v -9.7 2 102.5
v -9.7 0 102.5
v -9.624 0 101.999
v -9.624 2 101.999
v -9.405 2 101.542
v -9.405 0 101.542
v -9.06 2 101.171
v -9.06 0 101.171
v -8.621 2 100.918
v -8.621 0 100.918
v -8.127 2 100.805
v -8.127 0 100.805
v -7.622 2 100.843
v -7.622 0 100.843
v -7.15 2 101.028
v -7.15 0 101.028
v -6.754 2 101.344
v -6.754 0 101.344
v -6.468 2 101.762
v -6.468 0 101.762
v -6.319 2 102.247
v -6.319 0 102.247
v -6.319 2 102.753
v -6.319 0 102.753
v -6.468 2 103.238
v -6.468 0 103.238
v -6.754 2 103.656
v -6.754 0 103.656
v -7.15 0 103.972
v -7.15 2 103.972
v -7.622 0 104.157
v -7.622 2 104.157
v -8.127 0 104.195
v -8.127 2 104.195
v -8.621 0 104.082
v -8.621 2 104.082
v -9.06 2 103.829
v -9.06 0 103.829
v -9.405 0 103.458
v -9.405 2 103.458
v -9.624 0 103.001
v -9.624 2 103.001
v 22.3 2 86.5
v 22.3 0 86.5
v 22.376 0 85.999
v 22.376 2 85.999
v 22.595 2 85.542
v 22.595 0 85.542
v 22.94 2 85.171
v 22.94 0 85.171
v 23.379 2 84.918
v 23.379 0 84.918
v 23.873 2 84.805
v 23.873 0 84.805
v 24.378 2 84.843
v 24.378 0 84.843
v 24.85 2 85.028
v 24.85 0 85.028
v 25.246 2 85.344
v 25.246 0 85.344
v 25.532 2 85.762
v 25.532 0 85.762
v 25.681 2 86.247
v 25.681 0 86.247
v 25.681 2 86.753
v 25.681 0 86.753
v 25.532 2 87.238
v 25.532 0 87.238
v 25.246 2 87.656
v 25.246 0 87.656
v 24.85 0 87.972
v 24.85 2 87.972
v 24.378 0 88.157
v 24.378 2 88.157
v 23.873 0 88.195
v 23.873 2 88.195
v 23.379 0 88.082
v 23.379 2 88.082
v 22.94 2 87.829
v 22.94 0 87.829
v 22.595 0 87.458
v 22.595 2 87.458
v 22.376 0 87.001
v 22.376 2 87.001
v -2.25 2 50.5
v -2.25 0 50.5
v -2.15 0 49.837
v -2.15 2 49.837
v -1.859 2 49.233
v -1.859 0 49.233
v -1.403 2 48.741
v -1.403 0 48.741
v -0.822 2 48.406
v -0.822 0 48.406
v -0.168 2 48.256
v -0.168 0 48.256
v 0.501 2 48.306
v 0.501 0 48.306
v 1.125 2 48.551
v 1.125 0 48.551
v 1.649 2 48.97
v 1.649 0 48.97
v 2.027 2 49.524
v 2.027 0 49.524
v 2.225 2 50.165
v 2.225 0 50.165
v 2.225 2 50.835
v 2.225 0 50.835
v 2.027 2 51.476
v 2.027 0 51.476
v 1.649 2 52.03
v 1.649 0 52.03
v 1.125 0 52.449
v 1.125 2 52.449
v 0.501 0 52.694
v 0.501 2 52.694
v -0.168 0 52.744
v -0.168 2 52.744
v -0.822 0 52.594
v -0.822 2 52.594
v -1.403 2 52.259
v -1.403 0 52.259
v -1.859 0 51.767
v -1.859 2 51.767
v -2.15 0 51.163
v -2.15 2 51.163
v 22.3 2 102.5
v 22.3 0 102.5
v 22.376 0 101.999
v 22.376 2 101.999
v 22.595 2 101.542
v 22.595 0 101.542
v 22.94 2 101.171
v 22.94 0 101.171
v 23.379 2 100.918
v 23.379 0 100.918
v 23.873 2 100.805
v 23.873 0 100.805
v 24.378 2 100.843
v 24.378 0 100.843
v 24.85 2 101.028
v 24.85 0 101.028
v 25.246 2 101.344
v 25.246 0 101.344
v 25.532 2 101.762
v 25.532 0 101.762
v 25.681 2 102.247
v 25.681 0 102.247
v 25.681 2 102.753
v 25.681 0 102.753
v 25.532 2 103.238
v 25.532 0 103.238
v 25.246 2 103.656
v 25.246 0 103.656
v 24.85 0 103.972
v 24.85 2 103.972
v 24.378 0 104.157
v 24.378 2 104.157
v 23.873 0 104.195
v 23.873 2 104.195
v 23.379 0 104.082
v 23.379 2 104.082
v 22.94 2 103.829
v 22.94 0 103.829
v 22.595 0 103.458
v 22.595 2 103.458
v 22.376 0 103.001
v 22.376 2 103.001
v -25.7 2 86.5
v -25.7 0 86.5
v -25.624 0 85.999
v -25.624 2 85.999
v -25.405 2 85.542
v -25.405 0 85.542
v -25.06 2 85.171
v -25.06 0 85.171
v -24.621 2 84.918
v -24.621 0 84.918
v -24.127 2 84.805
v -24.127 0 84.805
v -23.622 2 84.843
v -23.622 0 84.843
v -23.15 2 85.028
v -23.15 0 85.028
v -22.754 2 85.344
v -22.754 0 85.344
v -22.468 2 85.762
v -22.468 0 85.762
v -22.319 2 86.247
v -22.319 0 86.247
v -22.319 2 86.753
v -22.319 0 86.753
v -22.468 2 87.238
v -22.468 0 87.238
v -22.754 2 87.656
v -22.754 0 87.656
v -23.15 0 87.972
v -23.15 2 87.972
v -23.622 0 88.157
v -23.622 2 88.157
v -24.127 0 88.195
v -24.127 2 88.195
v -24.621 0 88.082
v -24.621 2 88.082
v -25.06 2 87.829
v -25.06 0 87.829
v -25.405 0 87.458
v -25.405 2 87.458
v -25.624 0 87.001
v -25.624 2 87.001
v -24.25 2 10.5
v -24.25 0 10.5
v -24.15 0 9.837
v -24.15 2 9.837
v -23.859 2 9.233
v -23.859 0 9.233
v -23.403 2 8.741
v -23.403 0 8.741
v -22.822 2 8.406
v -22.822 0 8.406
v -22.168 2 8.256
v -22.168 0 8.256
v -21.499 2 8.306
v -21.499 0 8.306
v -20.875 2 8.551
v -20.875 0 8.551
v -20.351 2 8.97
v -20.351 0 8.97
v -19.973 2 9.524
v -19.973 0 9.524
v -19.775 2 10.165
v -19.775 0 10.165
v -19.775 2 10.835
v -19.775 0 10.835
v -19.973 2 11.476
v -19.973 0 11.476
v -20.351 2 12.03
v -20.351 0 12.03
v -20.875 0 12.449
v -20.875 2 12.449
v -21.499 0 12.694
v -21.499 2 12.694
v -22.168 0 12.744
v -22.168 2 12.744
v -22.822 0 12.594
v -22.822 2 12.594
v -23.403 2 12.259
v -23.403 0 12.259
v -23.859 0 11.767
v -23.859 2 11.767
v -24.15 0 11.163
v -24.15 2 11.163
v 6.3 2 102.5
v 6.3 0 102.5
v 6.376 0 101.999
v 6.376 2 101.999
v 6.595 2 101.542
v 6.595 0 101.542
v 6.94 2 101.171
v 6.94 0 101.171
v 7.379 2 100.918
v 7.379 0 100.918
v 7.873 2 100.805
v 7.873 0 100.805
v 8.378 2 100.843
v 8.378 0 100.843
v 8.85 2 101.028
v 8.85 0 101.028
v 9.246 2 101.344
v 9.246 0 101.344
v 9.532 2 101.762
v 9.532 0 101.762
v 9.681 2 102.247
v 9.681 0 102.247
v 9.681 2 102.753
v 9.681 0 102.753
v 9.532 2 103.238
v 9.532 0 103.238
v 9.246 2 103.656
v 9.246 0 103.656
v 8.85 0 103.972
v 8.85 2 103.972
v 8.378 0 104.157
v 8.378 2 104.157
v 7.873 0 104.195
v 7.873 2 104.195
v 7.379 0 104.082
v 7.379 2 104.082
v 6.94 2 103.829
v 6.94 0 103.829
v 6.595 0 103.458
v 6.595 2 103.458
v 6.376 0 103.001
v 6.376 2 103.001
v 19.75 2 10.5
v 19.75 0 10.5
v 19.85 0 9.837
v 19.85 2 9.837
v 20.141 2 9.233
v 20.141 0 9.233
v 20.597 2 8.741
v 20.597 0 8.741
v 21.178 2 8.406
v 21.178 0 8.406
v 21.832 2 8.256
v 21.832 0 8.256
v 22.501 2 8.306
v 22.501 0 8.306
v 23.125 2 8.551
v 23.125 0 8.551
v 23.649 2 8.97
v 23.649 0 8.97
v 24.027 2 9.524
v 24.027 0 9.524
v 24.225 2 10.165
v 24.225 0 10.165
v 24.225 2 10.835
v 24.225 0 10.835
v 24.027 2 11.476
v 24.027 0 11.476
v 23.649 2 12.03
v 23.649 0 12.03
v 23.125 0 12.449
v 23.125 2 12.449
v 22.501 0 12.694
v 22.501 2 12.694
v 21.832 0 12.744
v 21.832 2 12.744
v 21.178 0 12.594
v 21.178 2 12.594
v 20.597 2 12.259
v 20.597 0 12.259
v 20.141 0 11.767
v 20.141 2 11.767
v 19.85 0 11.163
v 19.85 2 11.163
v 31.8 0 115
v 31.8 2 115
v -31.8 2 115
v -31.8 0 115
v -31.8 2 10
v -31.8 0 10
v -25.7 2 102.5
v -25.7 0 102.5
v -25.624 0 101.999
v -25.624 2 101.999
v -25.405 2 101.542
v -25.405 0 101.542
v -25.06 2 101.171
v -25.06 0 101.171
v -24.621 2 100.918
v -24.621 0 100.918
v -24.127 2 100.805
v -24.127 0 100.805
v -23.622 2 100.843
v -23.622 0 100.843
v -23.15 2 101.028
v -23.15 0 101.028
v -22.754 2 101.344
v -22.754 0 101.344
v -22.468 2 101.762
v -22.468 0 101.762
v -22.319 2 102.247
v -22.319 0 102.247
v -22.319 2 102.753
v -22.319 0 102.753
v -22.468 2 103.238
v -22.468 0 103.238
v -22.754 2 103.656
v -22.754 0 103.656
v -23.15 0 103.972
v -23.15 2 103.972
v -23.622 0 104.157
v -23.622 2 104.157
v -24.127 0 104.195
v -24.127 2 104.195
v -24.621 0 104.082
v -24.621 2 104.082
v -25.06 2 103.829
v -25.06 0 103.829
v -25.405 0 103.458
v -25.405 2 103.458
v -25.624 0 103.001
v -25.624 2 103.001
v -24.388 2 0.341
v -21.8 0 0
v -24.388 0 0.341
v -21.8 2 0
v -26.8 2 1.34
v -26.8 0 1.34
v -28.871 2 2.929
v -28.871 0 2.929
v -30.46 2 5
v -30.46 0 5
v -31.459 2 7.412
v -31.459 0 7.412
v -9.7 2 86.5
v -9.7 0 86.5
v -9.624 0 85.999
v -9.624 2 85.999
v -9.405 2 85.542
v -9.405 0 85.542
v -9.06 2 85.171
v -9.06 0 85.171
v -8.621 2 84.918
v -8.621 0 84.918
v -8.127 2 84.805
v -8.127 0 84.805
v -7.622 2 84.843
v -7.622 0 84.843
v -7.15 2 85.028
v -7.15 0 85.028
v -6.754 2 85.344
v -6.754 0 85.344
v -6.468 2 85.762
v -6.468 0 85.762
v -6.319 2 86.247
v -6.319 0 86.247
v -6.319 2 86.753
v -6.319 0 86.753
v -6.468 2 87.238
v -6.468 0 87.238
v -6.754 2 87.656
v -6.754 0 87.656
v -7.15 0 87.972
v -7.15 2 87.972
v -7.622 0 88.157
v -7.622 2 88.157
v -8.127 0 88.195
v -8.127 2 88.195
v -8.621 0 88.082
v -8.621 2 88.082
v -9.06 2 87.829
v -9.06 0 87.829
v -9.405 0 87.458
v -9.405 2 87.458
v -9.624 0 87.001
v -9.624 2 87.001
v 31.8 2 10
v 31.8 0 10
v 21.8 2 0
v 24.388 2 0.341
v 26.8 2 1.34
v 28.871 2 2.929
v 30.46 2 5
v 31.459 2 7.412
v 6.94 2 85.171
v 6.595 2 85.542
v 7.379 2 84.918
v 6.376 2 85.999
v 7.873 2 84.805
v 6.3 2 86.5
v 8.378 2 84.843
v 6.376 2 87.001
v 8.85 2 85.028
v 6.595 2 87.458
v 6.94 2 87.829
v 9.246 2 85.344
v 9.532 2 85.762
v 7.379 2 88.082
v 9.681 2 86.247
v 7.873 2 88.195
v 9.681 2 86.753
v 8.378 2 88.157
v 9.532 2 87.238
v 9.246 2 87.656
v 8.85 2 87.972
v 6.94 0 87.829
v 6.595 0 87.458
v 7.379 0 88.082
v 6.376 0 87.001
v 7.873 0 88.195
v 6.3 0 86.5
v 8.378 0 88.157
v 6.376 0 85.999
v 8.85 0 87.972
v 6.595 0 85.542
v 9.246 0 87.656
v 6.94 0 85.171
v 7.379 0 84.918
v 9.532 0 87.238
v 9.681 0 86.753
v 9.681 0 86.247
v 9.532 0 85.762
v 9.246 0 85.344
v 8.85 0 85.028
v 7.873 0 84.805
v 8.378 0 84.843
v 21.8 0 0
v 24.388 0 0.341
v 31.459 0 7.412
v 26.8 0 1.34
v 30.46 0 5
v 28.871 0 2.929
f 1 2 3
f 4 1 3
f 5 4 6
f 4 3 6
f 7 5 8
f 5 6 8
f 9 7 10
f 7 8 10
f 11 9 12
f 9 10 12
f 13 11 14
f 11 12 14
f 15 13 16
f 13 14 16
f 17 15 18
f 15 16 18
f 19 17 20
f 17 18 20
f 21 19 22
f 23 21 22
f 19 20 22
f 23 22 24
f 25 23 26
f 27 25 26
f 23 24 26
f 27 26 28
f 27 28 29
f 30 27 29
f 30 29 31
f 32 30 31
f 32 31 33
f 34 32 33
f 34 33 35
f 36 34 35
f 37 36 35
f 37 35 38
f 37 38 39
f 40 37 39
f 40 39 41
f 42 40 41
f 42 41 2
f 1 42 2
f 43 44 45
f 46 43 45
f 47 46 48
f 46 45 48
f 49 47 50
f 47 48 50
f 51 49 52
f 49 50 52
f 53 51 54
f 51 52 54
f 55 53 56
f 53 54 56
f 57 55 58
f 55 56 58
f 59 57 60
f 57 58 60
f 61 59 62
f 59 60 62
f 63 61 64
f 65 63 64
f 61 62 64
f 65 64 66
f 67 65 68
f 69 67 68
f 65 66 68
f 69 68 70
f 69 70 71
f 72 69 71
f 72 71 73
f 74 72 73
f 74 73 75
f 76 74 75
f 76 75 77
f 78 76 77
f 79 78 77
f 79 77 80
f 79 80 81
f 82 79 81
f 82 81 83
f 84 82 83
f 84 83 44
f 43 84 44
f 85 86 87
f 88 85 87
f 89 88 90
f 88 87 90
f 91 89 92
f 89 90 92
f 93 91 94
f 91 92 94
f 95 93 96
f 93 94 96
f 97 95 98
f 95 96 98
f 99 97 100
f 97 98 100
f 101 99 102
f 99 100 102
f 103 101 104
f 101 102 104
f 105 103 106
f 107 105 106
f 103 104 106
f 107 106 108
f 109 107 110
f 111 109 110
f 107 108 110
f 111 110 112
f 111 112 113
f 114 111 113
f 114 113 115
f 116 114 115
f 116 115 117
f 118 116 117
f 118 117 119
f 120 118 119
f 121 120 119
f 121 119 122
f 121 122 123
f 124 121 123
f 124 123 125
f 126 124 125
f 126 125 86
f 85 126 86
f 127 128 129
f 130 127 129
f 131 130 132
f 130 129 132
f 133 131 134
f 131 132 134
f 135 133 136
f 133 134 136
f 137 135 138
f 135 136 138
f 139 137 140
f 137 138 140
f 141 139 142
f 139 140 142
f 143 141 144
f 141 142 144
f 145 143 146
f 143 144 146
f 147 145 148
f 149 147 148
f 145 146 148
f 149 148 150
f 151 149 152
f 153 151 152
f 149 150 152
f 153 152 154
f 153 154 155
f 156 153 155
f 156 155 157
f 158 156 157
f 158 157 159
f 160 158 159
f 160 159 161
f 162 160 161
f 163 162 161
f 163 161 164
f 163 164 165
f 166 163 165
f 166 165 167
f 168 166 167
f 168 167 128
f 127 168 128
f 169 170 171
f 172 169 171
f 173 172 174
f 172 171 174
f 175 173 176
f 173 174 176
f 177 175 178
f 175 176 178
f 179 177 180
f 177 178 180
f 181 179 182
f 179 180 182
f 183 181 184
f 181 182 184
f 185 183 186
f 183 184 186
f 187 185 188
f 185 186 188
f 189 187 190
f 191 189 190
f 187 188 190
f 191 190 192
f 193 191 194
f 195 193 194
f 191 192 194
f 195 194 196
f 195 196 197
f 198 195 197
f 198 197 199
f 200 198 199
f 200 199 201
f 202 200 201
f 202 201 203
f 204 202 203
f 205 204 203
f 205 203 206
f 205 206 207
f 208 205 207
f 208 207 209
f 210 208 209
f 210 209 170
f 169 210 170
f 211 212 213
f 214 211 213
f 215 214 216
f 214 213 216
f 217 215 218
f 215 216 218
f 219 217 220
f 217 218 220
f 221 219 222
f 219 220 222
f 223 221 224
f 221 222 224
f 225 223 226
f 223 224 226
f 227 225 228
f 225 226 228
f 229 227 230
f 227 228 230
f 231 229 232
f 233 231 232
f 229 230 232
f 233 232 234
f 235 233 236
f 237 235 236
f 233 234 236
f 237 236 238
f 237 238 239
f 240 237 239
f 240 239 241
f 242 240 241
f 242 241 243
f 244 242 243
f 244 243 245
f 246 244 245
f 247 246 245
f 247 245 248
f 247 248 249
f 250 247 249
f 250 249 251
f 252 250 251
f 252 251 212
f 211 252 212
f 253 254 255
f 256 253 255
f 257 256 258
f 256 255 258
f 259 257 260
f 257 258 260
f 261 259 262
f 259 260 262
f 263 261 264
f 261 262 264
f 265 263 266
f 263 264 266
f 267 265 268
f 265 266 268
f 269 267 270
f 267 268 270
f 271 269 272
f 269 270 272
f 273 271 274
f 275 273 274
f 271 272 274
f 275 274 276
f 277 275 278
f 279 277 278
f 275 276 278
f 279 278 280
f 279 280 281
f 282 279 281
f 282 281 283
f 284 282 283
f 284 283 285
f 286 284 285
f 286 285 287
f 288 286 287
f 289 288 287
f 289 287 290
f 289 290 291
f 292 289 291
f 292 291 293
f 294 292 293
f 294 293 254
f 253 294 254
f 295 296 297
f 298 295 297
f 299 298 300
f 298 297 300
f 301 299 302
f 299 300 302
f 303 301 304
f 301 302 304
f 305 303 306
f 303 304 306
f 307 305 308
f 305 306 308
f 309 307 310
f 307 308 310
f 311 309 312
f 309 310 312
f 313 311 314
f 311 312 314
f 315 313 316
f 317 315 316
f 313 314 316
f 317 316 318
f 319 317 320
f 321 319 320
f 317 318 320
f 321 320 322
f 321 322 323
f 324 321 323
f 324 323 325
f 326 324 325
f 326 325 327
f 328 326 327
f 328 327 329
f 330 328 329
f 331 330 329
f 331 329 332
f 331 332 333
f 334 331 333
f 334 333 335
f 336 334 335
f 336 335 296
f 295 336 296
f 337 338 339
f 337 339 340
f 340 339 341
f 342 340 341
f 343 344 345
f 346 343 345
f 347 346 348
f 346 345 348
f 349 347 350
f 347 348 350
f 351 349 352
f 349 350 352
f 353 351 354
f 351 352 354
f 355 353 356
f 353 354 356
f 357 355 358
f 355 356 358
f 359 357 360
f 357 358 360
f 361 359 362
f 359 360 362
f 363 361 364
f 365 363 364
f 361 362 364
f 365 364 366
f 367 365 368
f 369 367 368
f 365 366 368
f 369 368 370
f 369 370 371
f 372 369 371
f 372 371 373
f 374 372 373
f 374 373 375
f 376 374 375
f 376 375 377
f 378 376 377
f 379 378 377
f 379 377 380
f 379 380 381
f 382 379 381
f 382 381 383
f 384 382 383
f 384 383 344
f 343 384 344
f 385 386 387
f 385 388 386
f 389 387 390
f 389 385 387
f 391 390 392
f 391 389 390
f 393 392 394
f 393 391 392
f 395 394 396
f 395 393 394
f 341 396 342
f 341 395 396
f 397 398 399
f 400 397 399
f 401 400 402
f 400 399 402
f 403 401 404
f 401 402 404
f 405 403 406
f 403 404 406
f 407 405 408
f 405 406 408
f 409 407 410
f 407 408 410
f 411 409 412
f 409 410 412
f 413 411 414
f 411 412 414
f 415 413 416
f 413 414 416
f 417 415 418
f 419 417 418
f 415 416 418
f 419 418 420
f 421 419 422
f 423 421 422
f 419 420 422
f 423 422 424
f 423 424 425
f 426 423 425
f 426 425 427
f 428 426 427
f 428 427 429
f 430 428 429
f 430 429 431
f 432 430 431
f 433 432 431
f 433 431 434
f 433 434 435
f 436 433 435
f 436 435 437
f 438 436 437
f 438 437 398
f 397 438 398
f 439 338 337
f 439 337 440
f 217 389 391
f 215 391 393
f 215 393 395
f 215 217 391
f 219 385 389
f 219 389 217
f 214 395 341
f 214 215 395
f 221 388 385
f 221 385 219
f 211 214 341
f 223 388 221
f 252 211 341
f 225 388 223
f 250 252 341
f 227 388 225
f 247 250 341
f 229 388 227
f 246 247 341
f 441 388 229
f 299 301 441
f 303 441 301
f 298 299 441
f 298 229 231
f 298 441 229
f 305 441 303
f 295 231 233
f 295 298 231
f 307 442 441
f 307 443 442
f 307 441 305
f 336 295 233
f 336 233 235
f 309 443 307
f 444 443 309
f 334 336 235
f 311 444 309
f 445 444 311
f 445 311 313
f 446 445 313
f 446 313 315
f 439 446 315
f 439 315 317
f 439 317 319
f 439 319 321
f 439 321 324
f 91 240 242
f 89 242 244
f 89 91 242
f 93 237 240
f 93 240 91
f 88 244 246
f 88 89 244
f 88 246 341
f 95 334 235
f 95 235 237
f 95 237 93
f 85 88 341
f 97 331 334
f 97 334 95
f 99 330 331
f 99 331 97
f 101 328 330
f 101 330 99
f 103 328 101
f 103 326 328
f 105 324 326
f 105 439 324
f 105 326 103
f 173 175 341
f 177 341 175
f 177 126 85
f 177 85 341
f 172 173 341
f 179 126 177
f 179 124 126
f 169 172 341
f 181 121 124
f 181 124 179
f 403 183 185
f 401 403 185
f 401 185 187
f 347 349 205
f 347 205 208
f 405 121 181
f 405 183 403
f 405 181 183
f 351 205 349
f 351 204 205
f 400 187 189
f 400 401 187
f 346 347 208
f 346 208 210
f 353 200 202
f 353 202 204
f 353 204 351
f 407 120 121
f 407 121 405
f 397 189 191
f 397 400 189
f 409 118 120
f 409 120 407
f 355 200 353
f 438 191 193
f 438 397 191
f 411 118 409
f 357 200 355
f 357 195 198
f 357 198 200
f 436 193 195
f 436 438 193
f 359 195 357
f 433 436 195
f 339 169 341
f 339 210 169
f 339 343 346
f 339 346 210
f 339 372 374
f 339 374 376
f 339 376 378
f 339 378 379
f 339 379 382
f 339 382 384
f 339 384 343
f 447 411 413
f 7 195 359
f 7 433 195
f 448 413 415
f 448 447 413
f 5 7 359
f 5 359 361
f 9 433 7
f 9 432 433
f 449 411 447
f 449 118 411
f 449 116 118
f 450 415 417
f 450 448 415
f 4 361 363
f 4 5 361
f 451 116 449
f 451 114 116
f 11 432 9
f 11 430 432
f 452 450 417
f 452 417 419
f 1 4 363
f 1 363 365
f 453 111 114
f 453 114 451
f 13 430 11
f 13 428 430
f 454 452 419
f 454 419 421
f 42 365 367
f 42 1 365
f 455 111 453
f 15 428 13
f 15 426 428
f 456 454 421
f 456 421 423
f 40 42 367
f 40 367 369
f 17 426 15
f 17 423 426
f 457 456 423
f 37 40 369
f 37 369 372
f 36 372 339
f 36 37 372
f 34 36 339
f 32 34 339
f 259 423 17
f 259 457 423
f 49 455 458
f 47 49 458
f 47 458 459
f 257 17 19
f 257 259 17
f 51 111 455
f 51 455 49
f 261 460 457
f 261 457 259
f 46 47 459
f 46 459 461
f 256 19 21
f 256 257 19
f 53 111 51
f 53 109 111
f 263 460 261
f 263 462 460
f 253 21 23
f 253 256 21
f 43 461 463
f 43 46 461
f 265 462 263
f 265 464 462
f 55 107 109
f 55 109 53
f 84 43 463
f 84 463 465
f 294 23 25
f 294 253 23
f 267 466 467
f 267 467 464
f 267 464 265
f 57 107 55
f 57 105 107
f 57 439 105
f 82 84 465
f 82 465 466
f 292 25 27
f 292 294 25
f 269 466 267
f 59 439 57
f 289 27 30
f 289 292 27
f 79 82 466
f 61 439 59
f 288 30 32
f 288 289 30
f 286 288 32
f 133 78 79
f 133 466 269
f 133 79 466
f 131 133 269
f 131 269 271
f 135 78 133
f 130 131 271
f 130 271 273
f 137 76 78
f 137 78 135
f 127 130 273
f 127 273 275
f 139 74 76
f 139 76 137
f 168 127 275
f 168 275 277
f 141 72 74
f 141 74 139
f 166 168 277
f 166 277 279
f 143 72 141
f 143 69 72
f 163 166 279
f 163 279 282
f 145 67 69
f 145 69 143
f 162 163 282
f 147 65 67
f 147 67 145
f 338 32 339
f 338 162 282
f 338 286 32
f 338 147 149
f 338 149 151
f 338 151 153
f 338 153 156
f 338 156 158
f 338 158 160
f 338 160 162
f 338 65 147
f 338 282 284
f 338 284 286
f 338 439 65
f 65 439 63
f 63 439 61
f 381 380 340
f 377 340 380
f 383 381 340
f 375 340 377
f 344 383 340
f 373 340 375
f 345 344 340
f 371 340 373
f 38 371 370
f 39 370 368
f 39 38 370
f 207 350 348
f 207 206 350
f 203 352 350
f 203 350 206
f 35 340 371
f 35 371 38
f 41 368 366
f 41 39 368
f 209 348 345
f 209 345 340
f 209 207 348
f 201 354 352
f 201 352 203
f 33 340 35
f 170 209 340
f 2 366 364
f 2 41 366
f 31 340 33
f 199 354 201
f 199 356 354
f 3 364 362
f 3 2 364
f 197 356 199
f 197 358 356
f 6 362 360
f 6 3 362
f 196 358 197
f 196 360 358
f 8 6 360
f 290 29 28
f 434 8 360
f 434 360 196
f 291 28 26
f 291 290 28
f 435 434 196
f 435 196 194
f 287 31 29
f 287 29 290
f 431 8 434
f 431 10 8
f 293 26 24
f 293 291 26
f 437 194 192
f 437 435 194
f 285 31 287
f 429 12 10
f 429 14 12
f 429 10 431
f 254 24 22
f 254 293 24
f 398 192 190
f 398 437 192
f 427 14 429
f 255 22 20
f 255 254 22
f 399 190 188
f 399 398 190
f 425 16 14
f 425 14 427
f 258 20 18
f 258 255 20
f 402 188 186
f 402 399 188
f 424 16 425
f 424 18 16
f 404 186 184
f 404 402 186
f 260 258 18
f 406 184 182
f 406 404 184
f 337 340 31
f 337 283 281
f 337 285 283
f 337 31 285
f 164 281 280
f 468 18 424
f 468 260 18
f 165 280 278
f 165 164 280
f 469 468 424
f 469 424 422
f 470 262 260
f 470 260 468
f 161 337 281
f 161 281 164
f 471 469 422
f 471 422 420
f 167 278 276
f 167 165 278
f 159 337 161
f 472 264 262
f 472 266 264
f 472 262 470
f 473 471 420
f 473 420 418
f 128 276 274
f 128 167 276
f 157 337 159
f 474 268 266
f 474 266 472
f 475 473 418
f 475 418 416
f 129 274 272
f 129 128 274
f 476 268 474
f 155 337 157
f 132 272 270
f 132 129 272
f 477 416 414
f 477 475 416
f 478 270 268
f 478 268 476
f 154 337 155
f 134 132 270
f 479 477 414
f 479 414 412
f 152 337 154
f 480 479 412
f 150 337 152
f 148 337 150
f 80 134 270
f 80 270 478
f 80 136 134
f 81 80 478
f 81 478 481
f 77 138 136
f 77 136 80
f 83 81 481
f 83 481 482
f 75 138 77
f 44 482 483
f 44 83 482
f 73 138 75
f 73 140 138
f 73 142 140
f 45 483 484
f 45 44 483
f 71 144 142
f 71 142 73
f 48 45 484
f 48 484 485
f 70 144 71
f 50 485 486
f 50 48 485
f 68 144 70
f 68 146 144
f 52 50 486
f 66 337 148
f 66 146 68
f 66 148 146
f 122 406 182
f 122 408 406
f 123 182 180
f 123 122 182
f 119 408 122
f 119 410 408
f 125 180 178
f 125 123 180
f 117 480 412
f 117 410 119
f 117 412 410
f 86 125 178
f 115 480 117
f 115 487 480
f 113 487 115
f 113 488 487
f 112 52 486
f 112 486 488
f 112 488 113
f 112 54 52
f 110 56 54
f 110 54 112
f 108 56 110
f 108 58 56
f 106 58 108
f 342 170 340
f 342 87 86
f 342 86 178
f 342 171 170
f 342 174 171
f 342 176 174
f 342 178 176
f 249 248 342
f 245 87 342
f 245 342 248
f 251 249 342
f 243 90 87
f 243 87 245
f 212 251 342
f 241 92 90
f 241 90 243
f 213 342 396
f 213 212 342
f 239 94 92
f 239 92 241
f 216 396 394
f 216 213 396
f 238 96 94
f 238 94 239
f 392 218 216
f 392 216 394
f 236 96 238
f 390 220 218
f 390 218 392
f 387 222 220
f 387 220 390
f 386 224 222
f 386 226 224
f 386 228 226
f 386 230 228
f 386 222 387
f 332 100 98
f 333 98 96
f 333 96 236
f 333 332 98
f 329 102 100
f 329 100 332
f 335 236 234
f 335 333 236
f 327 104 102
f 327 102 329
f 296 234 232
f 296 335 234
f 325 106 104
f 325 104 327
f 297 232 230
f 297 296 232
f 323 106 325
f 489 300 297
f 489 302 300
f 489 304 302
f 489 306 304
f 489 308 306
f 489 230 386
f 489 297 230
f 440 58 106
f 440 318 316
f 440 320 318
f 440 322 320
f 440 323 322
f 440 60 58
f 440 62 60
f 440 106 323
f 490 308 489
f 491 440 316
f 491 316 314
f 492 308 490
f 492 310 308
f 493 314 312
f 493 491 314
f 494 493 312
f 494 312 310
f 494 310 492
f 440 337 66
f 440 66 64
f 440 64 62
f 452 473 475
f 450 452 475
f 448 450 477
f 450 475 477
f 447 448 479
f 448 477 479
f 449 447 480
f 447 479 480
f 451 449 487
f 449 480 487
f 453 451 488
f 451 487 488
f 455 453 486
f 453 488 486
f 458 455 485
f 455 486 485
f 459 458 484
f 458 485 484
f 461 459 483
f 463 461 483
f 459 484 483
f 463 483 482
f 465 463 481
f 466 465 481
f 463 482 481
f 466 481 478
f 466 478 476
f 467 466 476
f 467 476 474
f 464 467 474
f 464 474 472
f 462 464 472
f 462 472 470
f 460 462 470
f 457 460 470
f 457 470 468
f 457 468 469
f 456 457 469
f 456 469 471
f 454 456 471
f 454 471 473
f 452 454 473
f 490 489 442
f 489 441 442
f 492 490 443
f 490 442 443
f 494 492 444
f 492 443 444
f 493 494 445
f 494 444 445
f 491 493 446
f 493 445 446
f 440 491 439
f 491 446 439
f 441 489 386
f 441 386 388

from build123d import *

# Parameters (mm, degrees)
SHEET_EXTRUDE_DEPTH      = 31.8
M3_CLEARANCE_HOLE1_D     = 3.4
M3_CLEARANCE_HOLE1_DEPTH = 8.5
M3_CLEARANCE_HOLE1_TIP   = 1.021463052
M4_CLEARANCE_HOLE1_D     = 4.5
M4_CLEARANCE_HOLE1_DEPTH = 7.5
M4_CLEARANCE_HOLE1_TIP   = 1.351936393
FILLET1_R                = 10


with BuildPart() as part:
    # Sketch2 → Sheet Extrude (new body, symmetric)
    with BuildSketch(Plane(origin=(0, 0, 0), x_dir=(0, 0, -1), z_dir=(1, 0, 0))):
        Polygon((0, 0), (0, 2), (-35, 2), (-55, 2), (-115, 2), (-115, 0), (-55, 0), (-35, 0), align=None)
    extrude(amount=SHEET_EXTRUDE_DEPTH, both=True)

    # M3 Clearance Hole1
    with Locations(Plane(origin=(0, 2, 0), x_dir=(1, 0, 0), z_dir=(0, 1, 0))):
        with Locations((-24, -102.5), (-24, -86.5), (-8, -86.5), (-8, -102.5), (24, -102.5), (8, -102.5), (8, -86.5), (24, -86.5)):
            Hole(M3_CLEARANCE_HOLE1_D / 2, depth=M3_CLEARANCE_HOLE1_DEPTH)
            with Locations((0, 0, -(M3_CLEARANCE_HOLE1_DEPTH + M3_CLEARANCE_HOLE1_TIP / 2))):  # 118° drill point
                Cone(0, M3_CLEARANCE_HOLE1_D / 2, M3_CLEARANCE_HOLE1_TIP, mode=Mode.SUBTRACT)

    # M4 Clearance Hole1
    with Locations(Plane(origin=(0, 2, 0), x_dir=(1, 0, 0), z_dir=(0, 1, 0))):
        with Locations((0, -50.5), (22, -10.5), (-22, -10.5)):
            Hole(M4_CLEARANCE_HOLE1_D / 2, depth=M4_CLEARANCE_HOLE1_DEPTH)
            with Locations((0, 0, -(M4_CLEARANCE_HOLE1_DEPTH + M4_CLEARANCE_HOLE1_TIP / 2))):  # 118° drill point
                Cone(0, M4_CLEARANCE_HOLE1_D / 2, M4_CLEARANCE_HOLE1_TIP, mode=Mode.SUBTRACT)

    # Fillet1
    fillet1_edges = [part.edges().sort_by_distance(p)[0] for p in [
        (-31.8, 1, 0),
        (31.8, 1, 0),
    ]]
    fillet(fillet1_edges, radius=FILLET1_R)


solid = part.part
